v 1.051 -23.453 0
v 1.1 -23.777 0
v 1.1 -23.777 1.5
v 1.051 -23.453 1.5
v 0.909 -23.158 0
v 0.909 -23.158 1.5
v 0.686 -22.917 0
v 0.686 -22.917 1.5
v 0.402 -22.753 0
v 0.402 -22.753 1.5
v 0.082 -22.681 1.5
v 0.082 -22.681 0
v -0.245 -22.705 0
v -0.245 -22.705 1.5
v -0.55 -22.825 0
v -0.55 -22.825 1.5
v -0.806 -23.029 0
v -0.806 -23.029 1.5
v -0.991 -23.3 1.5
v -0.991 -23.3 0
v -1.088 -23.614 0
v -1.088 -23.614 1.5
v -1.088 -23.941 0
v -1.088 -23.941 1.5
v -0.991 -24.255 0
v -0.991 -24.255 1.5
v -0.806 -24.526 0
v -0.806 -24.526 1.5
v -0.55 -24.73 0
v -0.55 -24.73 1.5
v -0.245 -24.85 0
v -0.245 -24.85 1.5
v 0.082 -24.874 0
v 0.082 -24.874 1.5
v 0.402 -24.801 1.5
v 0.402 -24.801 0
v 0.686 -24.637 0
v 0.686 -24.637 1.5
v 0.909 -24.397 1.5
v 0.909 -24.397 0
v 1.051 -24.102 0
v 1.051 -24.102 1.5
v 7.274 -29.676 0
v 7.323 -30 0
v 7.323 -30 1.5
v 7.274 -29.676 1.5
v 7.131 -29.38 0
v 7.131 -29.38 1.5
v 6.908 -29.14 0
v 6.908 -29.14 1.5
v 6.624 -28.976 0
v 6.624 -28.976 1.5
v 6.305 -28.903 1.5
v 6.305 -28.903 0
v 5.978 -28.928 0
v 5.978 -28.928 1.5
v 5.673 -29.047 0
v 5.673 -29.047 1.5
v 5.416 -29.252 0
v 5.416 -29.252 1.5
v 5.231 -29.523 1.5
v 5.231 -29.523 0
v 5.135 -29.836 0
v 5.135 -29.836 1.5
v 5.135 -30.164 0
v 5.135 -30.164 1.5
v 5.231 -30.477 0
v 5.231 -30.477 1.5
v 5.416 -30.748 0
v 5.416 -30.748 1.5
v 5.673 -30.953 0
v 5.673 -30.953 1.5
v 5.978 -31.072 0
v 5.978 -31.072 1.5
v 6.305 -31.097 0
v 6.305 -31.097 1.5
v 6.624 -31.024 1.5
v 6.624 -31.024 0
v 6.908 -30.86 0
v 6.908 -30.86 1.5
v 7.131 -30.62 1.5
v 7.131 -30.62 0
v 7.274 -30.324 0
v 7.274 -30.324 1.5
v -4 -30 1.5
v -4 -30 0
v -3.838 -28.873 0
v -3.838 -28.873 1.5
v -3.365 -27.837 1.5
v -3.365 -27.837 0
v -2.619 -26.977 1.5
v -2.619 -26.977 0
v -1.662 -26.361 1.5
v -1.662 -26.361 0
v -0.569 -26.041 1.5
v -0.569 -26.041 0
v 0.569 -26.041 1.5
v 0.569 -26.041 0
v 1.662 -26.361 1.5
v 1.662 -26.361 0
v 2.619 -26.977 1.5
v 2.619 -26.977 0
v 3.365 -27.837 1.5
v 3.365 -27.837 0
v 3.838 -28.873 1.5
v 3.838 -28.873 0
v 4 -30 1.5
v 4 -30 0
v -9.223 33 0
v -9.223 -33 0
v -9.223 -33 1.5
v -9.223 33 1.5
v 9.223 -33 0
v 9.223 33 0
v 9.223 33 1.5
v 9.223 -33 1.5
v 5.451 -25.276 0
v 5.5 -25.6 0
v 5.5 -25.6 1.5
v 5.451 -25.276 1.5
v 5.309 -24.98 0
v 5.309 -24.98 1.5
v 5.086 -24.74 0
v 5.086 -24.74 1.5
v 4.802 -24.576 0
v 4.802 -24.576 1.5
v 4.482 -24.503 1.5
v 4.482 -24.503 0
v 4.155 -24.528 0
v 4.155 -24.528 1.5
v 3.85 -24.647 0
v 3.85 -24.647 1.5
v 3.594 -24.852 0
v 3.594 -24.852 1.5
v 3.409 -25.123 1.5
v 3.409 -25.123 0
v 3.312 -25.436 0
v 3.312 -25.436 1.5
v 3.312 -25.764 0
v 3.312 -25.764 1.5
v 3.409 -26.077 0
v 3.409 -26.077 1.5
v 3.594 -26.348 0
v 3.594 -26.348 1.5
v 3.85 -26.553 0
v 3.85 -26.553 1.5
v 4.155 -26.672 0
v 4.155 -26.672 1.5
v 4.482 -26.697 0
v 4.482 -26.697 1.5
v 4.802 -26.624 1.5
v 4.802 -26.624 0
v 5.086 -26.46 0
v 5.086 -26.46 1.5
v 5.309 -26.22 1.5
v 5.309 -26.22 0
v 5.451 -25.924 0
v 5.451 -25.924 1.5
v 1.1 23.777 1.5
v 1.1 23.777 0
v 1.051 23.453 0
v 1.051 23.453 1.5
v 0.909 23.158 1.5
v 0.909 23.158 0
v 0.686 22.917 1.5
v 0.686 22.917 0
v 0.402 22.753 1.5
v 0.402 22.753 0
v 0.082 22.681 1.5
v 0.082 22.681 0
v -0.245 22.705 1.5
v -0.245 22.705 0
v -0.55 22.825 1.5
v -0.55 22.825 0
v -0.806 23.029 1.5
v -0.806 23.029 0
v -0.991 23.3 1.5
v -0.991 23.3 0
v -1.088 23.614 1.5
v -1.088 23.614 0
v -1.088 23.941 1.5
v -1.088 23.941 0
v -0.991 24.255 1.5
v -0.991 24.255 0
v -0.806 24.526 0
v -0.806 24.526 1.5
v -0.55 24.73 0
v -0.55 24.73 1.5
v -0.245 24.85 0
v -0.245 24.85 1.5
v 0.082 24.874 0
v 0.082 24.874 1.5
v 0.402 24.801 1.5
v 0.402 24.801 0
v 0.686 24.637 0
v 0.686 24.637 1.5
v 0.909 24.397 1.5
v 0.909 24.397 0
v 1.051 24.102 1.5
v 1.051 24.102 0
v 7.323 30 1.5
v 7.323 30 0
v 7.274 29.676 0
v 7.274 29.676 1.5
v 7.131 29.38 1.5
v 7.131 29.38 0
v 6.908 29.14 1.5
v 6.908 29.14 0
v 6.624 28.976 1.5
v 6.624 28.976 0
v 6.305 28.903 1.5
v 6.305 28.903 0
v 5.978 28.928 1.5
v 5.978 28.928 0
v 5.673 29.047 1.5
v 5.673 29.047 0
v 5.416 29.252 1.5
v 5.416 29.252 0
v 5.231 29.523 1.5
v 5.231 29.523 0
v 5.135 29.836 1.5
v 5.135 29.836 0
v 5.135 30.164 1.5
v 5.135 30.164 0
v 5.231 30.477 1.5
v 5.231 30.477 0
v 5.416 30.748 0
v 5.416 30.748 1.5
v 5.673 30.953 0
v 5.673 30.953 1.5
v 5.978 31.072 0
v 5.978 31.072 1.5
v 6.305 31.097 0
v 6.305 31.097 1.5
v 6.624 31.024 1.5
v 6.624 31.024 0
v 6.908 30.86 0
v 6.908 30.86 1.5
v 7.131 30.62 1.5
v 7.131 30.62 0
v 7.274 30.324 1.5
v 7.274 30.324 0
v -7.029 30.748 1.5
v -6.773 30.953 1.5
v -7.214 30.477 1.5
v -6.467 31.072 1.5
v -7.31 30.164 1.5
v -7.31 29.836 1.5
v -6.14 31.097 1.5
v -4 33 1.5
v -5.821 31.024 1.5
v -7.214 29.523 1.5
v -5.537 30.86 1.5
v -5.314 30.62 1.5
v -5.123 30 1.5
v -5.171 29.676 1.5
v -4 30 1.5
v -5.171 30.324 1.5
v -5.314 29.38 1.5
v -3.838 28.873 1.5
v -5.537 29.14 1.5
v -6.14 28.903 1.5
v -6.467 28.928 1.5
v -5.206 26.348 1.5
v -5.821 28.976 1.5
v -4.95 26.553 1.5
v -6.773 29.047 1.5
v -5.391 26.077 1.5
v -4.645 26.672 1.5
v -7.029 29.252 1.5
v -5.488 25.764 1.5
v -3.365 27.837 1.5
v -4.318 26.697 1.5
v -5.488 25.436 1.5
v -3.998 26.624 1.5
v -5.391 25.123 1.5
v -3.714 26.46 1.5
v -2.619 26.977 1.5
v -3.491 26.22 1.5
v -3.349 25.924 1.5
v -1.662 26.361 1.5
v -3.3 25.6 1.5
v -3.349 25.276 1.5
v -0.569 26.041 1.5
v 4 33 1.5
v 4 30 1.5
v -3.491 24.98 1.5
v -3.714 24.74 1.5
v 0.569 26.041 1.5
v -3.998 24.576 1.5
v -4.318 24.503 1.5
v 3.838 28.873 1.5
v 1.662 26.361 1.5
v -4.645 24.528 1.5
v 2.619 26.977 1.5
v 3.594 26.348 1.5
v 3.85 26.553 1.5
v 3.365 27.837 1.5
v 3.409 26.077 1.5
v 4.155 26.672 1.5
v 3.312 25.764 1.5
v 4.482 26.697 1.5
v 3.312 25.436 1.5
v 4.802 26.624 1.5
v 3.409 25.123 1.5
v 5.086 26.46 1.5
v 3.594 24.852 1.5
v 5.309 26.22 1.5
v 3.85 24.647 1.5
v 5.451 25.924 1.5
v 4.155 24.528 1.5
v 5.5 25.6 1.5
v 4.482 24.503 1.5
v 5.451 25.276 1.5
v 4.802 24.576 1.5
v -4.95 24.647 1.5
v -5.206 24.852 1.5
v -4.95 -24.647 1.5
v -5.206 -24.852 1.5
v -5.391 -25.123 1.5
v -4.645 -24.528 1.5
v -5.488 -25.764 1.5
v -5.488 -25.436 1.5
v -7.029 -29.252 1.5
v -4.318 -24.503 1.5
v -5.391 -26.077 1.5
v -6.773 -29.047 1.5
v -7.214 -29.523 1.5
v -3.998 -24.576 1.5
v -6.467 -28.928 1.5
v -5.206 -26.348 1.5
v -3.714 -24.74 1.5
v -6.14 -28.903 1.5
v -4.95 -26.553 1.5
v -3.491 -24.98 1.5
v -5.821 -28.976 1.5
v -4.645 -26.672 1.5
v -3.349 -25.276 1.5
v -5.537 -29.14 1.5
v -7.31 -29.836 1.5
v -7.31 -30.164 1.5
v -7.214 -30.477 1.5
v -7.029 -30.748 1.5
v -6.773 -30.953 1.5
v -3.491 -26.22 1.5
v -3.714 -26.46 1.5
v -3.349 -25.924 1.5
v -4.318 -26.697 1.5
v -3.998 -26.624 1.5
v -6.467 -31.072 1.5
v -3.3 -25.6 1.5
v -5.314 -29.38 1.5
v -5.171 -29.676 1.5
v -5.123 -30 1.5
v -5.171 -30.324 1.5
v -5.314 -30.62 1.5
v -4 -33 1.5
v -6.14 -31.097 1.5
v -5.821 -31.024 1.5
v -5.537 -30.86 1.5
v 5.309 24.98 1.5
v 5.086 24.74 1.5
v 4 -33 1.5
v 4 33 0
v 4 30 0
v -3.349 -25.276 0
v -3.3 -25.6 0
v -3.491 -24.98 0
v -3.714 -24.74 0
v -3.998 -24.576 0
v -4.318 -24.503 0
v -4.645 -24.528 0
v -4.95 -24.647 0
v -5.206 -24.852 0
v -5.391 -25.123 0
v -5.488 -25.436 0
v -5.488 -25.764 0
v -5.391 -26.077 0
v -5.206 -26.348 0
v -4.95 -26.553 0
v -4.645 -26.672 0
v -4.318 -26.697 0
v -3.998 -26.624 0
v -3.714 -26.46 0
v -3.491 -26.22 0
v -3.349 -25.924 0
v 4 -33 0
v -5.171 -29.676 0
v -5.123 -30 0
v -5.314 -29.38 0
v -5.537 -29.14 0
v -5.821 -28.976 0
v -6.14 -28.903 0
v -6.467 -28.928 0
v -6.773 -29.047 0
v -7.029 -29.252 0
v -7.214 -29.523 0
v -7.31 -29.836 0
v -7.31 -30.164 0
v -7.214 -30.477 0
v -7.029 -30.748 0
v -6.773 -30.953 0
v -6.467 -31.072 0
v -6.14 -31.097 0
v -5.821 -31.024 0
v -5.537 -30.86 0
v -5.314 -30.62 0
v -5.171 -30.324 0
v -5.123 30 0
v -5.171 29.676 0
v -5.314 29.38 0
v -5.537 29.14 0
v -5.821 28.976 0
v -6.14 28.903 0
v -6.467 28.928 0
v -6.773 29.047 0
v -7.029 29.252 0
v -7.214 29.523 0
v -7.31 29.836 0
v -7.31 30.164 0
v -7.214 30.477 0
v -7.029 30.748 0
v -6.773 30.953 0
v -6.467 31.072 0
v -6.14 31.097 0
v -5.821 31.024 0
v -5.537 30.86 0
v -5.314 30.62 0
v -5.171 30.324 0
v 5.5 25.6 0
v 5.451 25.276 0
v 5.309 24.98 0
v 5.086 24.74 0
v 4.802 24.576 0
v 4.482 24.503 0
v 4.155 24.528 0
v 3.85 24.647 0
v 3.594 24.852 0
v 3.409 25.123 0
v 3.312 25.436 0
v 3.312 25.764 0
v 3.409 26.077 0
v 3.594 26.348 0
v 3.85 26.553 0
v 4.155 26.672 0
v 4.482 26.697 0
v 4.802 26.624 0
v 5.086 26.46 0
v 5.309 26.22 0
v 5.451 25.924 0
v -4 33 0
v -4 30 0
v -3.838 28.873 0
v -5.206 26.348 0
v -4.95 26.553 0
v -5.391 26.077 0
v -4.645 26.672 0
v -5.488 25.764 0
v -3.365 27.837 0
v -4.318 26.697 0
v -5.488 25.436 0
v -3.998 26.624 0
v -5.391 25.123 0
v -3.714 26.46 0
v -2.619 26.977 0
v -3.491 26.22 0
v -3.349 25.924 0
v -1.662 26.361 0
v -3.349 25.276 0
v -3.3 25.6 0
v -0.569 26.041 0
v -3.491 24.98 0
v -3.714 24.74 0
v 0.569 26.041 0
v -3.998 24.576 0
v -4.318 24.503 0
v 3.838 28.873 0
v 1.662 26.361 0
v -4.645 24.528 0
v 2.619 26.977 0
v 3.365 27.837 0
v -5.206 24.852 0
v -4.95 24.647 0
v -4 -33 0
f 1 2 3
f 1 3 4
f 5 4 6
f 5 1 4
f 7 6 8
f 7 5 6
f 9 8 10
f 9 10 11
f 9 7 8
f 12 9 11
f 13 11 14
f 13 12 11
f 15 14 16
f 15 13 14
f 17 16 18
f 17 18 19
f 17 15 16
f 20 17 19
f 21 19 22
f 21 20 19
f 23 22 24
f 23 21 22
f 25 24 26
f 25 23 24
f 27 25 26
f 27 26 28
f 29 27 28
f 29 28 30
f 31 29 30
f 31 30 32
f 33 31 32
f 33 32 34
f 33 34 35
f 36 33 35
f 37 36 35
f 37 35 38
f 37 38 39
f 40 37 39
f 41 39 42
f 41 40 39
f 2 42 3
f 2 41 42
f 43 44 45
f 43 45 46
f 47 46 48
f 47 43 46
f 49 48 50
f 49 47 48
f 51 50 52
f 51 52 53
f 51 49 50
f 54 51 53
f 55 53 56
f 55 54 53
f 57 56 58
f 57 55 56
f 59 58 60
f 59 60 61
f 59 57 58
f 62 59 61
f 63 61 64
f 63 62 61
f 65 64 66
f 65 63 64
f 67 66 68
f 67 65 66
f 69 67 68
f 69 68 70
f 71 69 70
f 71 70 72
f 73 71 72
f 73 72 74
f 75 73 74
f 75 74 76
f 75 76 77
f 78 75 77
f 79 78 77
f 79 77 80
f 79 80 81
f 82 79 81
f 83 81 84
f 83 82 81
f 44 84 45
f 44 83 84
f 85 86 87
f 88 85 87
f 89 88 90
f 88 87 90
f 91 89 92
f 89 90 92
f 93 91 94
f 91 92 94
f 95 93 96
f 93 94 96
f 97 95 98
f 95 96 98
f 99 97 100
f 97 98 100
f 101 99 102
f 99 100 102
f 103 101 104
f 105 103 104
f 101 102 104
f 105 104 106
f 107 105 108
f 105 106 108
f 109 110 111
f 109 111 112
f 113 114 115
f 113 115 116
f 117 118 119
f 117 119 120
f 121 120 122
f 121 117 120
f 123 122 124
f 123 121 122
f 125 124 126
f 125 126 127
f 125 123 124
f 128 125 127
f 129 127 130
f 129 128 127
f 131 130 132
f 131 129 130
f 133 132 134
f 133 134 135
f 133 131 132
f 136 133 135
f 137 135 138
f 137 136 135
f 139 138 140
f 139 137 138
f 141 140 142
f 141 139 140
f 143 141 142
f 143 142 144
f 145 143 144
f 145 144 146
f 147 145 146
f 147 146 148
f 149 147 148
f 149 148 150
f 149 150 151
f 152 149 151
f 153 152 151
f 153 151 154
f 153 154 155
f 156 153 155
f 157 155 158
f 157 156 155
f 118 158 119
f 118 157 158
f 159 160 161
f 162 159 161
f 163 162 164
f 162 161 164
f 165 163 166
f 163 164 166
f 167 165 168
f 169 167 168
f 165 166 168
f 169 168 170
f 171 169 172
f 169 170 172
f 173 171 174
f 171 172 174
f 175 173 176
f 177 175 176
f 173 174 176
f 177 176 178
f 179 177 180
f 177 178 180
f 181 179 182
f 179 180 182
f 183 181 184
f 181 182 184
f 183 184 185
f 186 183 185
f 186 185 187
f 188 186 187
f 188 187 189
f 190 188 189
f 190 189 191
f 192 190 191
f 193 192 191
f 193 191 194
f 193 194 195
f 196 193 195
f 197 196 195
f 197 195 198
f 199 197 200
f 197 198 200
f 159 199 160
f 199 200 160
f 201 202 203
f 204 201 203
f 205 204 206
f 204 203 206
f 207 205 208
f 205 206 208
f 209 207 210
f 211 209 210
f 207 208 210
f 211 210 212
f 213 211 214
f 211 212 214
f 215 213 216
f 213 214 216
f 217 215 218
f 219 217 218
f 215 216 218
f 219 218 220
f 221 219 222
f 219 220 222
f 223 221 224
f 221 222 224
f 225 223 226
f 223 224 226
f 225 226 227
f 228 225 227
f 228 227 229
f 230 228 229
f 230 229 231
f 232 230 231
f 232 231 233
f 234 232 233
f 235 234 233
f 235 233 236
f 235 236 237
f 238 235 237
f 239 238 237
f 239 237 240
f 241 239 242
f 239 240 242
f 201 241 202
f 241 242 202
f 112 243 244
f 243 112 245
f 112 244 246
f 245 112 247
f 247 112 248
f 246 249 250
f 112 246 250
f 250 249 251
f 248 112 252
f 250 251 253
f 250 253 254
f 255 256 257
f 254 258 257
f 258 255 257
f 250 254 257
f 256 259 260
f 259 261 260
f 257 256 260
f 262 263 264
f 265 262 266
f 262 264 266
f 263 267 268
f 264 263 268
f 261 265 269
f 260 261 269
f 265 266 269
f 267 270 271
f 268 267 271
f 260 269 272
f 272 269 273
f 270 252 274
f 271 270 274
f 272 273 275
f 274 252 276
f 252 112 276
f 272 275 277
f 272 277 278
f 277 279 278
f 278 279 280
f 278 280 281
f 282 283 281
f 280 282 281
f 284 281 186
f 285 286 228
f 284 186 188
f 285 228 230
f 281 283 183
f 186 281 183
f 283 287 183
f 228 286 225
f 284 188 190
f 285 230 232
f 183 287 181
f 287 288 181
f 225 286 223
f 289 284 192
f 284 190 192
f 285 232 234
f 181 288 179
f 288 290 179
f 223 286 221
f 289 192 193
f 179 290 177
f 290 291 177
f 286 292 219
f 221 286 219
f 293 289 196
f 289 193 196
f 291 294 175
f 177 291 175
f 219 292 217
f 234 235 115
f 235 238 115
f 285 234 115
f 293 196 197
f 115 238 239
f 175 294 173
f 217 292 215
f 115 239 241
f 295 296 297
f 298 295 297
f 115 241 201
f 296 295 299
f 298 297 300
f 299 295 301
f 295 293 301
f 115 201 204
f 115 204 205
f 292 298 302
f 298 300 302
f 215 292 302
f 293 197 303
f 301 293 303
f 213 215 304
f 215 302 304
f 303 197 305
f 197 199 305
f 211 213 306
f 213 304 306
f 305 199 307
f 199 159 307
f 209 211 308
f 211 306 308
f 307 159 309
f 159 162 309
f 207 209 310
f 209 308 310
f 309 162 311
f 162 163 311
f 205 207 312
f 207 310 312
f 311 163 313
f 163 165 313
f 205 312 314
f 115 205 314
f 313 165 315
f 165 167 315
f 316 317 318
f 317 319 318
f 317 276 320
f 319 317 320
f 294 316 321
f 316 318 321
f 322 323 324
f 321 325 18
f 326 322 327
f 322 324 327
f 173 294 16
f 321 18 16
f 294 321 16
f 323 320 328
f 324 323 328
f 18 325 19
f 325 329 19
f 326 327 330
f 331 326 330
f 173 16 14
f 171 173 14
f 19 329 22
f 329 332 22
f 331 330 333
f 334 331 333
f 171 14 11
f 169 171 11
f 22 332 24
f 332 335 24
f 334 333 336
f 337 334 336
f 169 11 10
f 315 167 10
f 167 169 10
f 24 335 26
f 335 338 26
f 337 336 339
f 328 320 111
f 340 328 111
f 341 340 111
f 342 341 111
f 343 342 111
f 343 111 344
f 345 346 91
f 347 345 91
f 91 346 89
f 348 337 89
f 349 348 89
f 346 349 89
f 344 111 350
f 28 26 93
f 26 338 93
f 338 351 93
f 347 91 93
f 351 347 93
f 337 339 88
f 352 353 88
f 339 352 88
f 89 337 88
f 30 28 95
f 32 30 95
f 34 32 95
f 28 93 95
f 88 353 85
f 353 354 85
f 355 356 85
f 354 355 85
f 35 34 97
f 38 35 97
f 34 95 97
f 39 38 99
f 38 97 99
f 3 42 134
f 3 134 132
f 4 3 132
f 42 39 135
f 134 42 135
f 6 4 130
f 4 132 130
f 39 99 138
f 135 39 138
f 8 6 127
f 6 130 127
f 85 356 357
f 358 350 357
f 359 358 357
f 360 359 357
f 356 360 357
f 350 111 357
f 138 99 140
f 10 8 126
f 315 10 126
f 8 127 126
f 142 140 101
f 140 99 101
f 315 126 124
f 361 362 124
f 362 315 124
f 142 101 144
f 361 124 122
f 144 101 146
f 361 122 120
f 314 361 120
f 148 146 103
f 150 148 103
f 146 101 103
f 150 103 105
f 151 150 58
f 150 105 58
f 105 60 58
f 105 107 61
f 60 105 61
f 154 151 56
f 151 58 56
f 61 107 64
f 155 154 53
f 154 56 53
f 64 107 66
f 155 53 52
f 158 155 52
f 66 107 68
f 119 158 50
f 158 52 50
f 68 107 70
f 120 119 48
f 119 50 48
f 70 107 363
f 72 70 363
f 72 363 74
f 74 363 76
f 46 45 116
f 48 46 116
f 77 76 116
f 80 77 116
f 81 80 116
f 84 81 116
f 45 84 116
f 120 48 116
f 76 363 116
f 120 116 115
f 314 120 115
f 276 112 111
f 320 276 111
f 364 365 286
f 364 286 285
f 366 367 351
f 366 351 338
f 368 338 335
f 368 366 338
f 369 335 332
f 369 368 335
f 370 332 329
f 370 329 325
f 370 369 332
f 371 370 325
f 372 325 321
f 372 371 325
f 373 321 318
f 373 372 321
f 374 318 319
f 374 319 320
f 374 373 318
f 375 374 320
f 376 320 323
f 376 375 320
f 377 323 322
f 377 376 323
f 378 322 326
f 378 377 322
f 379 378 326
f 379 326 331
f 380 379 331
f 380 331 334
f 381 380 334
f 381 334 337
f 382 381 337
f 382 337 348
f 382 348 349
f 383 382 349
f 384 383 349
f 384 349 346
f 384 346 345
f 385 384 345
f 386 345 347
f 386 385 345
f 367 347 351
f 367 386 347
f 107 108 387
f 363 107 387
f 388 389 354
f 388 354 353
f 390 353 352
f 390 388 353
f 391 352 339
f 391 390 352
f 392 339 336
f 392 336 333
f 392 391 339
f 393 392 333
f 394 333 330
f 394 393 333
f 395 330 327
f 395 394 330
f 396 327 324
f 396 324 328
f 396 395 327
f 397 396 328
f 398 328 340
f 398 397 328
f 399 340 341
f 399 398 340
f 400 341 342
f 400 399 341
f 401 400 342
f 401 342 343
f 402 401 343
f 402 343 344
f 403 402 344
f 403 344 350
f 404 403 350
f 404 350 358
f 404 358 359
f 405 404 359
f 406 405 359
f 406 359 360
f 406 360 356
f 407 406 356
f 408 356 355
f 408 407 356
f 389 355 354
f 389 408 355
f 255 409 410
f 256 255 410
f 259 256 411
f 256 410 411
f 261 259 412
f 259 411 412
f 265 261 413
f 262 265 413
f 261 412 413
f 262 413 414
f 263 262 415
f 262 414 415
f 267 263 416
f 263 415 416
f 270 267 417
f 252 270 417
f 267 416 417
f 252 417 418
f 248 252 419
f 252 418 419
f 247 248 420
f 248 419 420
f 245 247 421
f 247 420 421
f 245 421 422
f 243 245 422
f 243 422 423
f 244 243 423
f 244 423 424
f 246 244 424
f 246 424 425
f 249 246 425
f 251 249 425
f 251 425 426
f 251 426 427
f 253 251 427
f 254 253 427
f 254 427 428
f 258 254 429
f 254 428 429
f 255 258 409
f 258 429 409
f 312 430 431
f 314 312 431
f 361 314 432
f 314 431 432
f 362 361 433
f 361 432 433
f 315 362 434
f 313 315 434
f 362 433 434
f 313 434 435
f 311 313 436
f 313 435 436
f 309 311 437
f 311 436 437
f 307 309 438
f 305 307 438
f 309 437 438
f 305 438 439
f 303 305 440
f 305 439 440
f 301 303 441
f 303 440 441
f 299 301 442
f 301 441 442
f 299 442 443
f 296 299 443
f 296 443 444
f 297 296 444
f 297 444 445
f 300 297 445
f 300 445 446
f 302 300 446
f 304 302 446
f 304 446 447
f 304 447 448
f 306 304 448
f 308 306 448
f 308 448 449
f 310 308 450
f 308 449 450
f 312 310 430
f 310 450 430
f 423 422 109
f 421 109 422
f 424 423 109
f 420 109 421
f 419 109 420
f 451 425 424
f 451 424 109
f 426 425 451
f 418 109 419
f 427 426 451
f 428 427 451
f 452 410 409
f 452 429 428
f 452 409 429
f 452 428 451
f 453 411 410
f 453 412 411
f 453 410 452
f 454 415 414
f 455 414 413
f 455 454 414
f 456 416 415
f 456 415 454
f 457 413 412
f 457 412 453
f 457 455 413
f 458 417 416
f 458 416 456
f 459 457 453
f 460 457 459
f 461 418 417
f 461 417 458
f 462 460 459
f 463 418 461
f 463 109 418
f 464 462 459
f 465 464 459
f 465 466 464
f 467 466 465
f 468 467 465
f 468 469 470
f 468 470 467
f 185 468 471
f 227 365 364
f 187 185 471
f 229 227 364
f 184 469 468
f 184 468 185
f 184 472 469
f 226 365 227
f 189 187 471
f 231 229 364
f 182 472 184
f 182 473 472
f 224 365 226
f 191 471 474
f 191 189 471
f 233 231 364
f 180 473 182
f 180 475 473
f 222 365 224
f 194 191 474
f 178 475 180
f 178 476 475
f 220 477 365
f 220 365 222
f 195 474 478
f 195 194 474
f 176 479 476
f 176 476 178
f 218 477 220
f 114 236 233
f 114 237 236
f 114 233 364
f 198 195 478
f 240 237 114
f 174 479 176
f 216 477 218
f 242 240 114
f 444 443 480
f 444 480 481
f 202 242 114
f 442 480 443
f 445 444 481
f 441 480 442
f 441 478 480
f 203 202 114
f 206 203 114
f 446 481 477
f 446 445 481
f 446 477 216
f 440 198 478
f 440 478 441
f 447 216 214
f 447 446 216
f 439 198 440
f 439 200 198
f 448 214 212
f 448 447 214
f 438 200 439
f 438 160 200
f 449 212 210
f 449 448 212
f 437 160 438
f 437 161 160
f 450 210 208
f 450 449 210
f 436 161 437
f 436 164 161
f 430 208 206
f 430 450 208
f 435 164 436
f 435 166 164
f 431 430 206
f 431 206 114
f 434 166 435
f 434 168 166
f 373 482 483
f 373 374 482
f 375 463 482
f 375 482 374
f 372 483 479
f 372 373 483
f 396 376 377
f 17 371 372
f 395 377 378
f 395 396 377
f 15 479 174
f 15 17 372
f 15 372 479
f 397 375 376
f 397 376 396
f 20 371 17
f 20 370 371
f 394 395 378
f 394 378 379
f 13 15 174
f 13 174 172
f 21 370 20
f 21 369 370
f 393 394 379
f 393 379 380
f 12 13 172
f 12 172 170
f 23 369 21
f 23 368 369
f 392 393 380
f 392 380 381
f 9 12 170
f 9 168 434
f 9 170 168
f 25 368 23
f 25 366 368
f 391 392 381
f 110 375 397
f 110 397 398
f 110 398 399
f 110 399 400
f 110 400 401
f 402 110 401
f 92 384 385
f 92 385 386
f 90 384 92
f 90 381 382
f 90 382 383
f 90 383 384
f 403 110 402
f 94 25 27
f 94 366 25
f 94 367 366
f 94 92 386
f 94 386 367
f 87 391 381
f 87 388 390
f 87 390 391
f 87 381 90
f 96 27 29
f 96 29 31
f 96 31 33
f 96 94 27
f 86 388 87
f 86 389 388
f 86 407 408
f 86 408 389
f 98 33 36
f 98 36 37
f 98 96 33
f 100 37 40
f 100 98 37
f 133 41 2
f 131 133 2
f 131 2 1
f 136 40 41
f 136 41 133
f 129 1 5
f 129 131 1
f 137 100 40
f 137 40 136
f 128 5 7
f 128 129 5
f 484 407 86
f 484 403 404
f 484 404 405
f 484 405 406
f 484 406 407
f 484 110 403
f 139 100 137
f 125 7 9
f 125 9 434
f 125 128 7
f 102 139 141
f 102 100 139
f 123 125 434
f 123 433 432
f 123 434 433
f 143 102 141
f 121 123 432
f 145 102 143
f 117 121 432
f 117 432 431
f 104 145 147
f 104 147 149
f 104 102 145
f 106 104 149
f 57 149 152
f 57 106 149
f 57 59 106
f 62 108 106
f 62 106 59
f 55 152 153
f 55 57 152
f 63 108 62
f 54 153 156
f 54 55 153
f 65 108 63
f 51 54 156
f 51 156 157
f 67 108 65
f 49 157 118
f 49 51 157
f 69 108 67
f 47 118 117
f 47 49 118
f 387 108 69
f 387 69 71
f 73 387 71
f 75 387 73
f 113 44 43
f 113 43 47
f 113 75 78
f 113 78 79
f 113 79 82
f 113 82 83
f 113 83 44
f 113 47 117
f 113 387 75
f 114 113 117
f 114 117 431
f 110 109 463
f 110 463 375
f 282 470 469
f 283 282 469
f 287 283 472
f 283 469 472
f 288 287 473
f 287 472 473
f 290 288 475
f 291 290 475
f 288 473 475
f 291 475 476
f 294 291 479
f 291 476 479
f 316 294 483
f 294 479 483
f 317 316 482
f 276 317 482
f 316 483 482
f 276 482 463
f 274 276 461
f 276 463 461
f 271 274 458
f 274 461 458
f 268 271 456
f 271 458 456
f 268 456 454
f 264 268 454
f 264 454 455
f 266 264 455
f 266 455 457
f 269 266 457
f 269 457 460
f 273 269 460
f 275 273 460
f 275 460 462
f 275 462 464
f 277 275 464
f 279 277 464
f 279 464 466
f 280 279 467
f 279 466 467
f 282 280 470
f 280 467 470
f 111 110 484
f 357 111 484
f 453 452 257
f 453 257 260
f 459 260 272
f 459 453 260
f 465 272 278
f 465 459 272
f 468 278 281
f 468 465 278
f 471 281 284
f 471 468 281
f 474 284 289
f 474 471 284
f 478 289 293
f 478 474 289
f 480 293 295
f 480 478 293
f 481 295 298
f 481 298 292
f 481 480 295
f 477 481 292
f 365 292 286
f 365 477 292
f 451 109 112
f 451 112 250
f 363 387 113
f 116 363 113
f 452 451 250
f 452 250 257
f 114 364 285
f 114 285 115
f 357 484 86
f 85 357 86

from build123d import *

# Parameters (mm, degrees)
F0_R     = 1.1
F1_DEPTH = 1.5
F2_R     = 1.1
F3_DEPTH = 1.5


with BuildPart() as f1:
    # F0 (on Top) → F1 (new body)
    with BuildSketch(Plane.XY):
        with BuildLine():
            Line((9.22254, 33), (-9.22254, 33))
            Line((-9.22254, 33), (-9.22254, -33))
            Line((-9.22254, -33), (-4, -33))
            Line((-4, -33), (-4, -30))
            ThreePointArc((-4, -30), (0, -26), (4, -30))
            Line((4, -30), (4, -33))
            Line((4, -33), (9.22254, -33))
            Line((9.22254, -33), (9.22254, 19.77746))
            Line((9.22254, 19.77746), (6.22254, 19.77746))
            ThreePointArc((6.22254, 19.77746), (2.22254, 23.77746), (6.22254, 27.77746))
            Line((6.22254, 27.77746), (9.22254, 27.77746))
            Line((9.22254, 27.77746), (9.22254, 33))
        make_face()
        with Locations((-6.22254, -30)):
            Circle(F0_R, mode=Mode.SUBTRACT)
        with Locations((-4.4, -25.6)):
            Circle(F0_R, mode=Mode.SUBTRACT)
        with Locations((4.4, -25.6)):
            Circle(F0_R, mode=Mode.SUBTRACT)
        with Locations((0, -23.77746)):
            Circle(F0_R, mode=Mode.SUBTRACT)
        with Locations((6.22254, -30)):
            Circle(F0_R, mode=Mode.SUBTRACT)
        with Locations((1.82254, 19.37746)):
            Circle(F0_R, mode=Mode.SUBTRACT)
        with Locations((0, 23.77746)):
            Circle(F0_R, mode=Mode.SUBTRACT)
        with Locations((1.82254, 28.17746)):
            Circle(F0_R, mode=Mode.SUBTRACT)
        with Locations((6.22254, 17.554921)):
            Circle(F0_R, mode=Mode.SUBTRACT)
        with Locations((6.22254, 30)):
            Circle(F0_R, mode=Mode.SUBTRACT)
    extrude(amount=F1_DEPTH)

    # F2 (on face) → F3 (cut, through all)
    with BuildSketch(Plane.XY.offset(1.5)):
        with BuildLine():
            Line((-9.22254, 0), (9.22254, 0))
            Line((9.22254, 0), (9.22254, 19.77746))
            Line((9.22254, 19.77746), (6.22254, 19.77746))
            ThreePointArc((6.22254, 19.77746), (2.22254, 23.77746), (6.22254, 27.77746))
            Line((6.22254, 27.77746), (9.22254, 27.77746))
            Line((9.22254, 27.77746), (9.22254, 33))
            Line((9.22254, 33), (-9.22254, 33))
            Line((-9.22254, 33), (-9.22254, 0))
        make_face()
        with Locations((1.82254, 19.37746)):
            Circle(F2_R, mode=Mode.SUBTRACT)
        with Locations((0, 23.77746)):
            Circle(F2_R, mode=Mode.SUBTRACT)
        with Locations((1.82254, 28.17746)):
            Circle(F2_R, mode=Mode.SUBTRACT)
        with Locations((6.22254, 17.554921)):
            Circle(F2_R, mode=Mode.SUBTRACT)
        with Locations((6.22254, 30)):
            Circle(F2_R, mode=Mode.SUBTRACT)
    extrude(amount=-F3_DEPTH, mode=Mode.SUBTRACT)

    # F4: F1 across plane


with BuildPart() as f1_1:
    add(f1.part)
    add(f1.part.mirror(Plane.XZ))


solid = f1_1.part
